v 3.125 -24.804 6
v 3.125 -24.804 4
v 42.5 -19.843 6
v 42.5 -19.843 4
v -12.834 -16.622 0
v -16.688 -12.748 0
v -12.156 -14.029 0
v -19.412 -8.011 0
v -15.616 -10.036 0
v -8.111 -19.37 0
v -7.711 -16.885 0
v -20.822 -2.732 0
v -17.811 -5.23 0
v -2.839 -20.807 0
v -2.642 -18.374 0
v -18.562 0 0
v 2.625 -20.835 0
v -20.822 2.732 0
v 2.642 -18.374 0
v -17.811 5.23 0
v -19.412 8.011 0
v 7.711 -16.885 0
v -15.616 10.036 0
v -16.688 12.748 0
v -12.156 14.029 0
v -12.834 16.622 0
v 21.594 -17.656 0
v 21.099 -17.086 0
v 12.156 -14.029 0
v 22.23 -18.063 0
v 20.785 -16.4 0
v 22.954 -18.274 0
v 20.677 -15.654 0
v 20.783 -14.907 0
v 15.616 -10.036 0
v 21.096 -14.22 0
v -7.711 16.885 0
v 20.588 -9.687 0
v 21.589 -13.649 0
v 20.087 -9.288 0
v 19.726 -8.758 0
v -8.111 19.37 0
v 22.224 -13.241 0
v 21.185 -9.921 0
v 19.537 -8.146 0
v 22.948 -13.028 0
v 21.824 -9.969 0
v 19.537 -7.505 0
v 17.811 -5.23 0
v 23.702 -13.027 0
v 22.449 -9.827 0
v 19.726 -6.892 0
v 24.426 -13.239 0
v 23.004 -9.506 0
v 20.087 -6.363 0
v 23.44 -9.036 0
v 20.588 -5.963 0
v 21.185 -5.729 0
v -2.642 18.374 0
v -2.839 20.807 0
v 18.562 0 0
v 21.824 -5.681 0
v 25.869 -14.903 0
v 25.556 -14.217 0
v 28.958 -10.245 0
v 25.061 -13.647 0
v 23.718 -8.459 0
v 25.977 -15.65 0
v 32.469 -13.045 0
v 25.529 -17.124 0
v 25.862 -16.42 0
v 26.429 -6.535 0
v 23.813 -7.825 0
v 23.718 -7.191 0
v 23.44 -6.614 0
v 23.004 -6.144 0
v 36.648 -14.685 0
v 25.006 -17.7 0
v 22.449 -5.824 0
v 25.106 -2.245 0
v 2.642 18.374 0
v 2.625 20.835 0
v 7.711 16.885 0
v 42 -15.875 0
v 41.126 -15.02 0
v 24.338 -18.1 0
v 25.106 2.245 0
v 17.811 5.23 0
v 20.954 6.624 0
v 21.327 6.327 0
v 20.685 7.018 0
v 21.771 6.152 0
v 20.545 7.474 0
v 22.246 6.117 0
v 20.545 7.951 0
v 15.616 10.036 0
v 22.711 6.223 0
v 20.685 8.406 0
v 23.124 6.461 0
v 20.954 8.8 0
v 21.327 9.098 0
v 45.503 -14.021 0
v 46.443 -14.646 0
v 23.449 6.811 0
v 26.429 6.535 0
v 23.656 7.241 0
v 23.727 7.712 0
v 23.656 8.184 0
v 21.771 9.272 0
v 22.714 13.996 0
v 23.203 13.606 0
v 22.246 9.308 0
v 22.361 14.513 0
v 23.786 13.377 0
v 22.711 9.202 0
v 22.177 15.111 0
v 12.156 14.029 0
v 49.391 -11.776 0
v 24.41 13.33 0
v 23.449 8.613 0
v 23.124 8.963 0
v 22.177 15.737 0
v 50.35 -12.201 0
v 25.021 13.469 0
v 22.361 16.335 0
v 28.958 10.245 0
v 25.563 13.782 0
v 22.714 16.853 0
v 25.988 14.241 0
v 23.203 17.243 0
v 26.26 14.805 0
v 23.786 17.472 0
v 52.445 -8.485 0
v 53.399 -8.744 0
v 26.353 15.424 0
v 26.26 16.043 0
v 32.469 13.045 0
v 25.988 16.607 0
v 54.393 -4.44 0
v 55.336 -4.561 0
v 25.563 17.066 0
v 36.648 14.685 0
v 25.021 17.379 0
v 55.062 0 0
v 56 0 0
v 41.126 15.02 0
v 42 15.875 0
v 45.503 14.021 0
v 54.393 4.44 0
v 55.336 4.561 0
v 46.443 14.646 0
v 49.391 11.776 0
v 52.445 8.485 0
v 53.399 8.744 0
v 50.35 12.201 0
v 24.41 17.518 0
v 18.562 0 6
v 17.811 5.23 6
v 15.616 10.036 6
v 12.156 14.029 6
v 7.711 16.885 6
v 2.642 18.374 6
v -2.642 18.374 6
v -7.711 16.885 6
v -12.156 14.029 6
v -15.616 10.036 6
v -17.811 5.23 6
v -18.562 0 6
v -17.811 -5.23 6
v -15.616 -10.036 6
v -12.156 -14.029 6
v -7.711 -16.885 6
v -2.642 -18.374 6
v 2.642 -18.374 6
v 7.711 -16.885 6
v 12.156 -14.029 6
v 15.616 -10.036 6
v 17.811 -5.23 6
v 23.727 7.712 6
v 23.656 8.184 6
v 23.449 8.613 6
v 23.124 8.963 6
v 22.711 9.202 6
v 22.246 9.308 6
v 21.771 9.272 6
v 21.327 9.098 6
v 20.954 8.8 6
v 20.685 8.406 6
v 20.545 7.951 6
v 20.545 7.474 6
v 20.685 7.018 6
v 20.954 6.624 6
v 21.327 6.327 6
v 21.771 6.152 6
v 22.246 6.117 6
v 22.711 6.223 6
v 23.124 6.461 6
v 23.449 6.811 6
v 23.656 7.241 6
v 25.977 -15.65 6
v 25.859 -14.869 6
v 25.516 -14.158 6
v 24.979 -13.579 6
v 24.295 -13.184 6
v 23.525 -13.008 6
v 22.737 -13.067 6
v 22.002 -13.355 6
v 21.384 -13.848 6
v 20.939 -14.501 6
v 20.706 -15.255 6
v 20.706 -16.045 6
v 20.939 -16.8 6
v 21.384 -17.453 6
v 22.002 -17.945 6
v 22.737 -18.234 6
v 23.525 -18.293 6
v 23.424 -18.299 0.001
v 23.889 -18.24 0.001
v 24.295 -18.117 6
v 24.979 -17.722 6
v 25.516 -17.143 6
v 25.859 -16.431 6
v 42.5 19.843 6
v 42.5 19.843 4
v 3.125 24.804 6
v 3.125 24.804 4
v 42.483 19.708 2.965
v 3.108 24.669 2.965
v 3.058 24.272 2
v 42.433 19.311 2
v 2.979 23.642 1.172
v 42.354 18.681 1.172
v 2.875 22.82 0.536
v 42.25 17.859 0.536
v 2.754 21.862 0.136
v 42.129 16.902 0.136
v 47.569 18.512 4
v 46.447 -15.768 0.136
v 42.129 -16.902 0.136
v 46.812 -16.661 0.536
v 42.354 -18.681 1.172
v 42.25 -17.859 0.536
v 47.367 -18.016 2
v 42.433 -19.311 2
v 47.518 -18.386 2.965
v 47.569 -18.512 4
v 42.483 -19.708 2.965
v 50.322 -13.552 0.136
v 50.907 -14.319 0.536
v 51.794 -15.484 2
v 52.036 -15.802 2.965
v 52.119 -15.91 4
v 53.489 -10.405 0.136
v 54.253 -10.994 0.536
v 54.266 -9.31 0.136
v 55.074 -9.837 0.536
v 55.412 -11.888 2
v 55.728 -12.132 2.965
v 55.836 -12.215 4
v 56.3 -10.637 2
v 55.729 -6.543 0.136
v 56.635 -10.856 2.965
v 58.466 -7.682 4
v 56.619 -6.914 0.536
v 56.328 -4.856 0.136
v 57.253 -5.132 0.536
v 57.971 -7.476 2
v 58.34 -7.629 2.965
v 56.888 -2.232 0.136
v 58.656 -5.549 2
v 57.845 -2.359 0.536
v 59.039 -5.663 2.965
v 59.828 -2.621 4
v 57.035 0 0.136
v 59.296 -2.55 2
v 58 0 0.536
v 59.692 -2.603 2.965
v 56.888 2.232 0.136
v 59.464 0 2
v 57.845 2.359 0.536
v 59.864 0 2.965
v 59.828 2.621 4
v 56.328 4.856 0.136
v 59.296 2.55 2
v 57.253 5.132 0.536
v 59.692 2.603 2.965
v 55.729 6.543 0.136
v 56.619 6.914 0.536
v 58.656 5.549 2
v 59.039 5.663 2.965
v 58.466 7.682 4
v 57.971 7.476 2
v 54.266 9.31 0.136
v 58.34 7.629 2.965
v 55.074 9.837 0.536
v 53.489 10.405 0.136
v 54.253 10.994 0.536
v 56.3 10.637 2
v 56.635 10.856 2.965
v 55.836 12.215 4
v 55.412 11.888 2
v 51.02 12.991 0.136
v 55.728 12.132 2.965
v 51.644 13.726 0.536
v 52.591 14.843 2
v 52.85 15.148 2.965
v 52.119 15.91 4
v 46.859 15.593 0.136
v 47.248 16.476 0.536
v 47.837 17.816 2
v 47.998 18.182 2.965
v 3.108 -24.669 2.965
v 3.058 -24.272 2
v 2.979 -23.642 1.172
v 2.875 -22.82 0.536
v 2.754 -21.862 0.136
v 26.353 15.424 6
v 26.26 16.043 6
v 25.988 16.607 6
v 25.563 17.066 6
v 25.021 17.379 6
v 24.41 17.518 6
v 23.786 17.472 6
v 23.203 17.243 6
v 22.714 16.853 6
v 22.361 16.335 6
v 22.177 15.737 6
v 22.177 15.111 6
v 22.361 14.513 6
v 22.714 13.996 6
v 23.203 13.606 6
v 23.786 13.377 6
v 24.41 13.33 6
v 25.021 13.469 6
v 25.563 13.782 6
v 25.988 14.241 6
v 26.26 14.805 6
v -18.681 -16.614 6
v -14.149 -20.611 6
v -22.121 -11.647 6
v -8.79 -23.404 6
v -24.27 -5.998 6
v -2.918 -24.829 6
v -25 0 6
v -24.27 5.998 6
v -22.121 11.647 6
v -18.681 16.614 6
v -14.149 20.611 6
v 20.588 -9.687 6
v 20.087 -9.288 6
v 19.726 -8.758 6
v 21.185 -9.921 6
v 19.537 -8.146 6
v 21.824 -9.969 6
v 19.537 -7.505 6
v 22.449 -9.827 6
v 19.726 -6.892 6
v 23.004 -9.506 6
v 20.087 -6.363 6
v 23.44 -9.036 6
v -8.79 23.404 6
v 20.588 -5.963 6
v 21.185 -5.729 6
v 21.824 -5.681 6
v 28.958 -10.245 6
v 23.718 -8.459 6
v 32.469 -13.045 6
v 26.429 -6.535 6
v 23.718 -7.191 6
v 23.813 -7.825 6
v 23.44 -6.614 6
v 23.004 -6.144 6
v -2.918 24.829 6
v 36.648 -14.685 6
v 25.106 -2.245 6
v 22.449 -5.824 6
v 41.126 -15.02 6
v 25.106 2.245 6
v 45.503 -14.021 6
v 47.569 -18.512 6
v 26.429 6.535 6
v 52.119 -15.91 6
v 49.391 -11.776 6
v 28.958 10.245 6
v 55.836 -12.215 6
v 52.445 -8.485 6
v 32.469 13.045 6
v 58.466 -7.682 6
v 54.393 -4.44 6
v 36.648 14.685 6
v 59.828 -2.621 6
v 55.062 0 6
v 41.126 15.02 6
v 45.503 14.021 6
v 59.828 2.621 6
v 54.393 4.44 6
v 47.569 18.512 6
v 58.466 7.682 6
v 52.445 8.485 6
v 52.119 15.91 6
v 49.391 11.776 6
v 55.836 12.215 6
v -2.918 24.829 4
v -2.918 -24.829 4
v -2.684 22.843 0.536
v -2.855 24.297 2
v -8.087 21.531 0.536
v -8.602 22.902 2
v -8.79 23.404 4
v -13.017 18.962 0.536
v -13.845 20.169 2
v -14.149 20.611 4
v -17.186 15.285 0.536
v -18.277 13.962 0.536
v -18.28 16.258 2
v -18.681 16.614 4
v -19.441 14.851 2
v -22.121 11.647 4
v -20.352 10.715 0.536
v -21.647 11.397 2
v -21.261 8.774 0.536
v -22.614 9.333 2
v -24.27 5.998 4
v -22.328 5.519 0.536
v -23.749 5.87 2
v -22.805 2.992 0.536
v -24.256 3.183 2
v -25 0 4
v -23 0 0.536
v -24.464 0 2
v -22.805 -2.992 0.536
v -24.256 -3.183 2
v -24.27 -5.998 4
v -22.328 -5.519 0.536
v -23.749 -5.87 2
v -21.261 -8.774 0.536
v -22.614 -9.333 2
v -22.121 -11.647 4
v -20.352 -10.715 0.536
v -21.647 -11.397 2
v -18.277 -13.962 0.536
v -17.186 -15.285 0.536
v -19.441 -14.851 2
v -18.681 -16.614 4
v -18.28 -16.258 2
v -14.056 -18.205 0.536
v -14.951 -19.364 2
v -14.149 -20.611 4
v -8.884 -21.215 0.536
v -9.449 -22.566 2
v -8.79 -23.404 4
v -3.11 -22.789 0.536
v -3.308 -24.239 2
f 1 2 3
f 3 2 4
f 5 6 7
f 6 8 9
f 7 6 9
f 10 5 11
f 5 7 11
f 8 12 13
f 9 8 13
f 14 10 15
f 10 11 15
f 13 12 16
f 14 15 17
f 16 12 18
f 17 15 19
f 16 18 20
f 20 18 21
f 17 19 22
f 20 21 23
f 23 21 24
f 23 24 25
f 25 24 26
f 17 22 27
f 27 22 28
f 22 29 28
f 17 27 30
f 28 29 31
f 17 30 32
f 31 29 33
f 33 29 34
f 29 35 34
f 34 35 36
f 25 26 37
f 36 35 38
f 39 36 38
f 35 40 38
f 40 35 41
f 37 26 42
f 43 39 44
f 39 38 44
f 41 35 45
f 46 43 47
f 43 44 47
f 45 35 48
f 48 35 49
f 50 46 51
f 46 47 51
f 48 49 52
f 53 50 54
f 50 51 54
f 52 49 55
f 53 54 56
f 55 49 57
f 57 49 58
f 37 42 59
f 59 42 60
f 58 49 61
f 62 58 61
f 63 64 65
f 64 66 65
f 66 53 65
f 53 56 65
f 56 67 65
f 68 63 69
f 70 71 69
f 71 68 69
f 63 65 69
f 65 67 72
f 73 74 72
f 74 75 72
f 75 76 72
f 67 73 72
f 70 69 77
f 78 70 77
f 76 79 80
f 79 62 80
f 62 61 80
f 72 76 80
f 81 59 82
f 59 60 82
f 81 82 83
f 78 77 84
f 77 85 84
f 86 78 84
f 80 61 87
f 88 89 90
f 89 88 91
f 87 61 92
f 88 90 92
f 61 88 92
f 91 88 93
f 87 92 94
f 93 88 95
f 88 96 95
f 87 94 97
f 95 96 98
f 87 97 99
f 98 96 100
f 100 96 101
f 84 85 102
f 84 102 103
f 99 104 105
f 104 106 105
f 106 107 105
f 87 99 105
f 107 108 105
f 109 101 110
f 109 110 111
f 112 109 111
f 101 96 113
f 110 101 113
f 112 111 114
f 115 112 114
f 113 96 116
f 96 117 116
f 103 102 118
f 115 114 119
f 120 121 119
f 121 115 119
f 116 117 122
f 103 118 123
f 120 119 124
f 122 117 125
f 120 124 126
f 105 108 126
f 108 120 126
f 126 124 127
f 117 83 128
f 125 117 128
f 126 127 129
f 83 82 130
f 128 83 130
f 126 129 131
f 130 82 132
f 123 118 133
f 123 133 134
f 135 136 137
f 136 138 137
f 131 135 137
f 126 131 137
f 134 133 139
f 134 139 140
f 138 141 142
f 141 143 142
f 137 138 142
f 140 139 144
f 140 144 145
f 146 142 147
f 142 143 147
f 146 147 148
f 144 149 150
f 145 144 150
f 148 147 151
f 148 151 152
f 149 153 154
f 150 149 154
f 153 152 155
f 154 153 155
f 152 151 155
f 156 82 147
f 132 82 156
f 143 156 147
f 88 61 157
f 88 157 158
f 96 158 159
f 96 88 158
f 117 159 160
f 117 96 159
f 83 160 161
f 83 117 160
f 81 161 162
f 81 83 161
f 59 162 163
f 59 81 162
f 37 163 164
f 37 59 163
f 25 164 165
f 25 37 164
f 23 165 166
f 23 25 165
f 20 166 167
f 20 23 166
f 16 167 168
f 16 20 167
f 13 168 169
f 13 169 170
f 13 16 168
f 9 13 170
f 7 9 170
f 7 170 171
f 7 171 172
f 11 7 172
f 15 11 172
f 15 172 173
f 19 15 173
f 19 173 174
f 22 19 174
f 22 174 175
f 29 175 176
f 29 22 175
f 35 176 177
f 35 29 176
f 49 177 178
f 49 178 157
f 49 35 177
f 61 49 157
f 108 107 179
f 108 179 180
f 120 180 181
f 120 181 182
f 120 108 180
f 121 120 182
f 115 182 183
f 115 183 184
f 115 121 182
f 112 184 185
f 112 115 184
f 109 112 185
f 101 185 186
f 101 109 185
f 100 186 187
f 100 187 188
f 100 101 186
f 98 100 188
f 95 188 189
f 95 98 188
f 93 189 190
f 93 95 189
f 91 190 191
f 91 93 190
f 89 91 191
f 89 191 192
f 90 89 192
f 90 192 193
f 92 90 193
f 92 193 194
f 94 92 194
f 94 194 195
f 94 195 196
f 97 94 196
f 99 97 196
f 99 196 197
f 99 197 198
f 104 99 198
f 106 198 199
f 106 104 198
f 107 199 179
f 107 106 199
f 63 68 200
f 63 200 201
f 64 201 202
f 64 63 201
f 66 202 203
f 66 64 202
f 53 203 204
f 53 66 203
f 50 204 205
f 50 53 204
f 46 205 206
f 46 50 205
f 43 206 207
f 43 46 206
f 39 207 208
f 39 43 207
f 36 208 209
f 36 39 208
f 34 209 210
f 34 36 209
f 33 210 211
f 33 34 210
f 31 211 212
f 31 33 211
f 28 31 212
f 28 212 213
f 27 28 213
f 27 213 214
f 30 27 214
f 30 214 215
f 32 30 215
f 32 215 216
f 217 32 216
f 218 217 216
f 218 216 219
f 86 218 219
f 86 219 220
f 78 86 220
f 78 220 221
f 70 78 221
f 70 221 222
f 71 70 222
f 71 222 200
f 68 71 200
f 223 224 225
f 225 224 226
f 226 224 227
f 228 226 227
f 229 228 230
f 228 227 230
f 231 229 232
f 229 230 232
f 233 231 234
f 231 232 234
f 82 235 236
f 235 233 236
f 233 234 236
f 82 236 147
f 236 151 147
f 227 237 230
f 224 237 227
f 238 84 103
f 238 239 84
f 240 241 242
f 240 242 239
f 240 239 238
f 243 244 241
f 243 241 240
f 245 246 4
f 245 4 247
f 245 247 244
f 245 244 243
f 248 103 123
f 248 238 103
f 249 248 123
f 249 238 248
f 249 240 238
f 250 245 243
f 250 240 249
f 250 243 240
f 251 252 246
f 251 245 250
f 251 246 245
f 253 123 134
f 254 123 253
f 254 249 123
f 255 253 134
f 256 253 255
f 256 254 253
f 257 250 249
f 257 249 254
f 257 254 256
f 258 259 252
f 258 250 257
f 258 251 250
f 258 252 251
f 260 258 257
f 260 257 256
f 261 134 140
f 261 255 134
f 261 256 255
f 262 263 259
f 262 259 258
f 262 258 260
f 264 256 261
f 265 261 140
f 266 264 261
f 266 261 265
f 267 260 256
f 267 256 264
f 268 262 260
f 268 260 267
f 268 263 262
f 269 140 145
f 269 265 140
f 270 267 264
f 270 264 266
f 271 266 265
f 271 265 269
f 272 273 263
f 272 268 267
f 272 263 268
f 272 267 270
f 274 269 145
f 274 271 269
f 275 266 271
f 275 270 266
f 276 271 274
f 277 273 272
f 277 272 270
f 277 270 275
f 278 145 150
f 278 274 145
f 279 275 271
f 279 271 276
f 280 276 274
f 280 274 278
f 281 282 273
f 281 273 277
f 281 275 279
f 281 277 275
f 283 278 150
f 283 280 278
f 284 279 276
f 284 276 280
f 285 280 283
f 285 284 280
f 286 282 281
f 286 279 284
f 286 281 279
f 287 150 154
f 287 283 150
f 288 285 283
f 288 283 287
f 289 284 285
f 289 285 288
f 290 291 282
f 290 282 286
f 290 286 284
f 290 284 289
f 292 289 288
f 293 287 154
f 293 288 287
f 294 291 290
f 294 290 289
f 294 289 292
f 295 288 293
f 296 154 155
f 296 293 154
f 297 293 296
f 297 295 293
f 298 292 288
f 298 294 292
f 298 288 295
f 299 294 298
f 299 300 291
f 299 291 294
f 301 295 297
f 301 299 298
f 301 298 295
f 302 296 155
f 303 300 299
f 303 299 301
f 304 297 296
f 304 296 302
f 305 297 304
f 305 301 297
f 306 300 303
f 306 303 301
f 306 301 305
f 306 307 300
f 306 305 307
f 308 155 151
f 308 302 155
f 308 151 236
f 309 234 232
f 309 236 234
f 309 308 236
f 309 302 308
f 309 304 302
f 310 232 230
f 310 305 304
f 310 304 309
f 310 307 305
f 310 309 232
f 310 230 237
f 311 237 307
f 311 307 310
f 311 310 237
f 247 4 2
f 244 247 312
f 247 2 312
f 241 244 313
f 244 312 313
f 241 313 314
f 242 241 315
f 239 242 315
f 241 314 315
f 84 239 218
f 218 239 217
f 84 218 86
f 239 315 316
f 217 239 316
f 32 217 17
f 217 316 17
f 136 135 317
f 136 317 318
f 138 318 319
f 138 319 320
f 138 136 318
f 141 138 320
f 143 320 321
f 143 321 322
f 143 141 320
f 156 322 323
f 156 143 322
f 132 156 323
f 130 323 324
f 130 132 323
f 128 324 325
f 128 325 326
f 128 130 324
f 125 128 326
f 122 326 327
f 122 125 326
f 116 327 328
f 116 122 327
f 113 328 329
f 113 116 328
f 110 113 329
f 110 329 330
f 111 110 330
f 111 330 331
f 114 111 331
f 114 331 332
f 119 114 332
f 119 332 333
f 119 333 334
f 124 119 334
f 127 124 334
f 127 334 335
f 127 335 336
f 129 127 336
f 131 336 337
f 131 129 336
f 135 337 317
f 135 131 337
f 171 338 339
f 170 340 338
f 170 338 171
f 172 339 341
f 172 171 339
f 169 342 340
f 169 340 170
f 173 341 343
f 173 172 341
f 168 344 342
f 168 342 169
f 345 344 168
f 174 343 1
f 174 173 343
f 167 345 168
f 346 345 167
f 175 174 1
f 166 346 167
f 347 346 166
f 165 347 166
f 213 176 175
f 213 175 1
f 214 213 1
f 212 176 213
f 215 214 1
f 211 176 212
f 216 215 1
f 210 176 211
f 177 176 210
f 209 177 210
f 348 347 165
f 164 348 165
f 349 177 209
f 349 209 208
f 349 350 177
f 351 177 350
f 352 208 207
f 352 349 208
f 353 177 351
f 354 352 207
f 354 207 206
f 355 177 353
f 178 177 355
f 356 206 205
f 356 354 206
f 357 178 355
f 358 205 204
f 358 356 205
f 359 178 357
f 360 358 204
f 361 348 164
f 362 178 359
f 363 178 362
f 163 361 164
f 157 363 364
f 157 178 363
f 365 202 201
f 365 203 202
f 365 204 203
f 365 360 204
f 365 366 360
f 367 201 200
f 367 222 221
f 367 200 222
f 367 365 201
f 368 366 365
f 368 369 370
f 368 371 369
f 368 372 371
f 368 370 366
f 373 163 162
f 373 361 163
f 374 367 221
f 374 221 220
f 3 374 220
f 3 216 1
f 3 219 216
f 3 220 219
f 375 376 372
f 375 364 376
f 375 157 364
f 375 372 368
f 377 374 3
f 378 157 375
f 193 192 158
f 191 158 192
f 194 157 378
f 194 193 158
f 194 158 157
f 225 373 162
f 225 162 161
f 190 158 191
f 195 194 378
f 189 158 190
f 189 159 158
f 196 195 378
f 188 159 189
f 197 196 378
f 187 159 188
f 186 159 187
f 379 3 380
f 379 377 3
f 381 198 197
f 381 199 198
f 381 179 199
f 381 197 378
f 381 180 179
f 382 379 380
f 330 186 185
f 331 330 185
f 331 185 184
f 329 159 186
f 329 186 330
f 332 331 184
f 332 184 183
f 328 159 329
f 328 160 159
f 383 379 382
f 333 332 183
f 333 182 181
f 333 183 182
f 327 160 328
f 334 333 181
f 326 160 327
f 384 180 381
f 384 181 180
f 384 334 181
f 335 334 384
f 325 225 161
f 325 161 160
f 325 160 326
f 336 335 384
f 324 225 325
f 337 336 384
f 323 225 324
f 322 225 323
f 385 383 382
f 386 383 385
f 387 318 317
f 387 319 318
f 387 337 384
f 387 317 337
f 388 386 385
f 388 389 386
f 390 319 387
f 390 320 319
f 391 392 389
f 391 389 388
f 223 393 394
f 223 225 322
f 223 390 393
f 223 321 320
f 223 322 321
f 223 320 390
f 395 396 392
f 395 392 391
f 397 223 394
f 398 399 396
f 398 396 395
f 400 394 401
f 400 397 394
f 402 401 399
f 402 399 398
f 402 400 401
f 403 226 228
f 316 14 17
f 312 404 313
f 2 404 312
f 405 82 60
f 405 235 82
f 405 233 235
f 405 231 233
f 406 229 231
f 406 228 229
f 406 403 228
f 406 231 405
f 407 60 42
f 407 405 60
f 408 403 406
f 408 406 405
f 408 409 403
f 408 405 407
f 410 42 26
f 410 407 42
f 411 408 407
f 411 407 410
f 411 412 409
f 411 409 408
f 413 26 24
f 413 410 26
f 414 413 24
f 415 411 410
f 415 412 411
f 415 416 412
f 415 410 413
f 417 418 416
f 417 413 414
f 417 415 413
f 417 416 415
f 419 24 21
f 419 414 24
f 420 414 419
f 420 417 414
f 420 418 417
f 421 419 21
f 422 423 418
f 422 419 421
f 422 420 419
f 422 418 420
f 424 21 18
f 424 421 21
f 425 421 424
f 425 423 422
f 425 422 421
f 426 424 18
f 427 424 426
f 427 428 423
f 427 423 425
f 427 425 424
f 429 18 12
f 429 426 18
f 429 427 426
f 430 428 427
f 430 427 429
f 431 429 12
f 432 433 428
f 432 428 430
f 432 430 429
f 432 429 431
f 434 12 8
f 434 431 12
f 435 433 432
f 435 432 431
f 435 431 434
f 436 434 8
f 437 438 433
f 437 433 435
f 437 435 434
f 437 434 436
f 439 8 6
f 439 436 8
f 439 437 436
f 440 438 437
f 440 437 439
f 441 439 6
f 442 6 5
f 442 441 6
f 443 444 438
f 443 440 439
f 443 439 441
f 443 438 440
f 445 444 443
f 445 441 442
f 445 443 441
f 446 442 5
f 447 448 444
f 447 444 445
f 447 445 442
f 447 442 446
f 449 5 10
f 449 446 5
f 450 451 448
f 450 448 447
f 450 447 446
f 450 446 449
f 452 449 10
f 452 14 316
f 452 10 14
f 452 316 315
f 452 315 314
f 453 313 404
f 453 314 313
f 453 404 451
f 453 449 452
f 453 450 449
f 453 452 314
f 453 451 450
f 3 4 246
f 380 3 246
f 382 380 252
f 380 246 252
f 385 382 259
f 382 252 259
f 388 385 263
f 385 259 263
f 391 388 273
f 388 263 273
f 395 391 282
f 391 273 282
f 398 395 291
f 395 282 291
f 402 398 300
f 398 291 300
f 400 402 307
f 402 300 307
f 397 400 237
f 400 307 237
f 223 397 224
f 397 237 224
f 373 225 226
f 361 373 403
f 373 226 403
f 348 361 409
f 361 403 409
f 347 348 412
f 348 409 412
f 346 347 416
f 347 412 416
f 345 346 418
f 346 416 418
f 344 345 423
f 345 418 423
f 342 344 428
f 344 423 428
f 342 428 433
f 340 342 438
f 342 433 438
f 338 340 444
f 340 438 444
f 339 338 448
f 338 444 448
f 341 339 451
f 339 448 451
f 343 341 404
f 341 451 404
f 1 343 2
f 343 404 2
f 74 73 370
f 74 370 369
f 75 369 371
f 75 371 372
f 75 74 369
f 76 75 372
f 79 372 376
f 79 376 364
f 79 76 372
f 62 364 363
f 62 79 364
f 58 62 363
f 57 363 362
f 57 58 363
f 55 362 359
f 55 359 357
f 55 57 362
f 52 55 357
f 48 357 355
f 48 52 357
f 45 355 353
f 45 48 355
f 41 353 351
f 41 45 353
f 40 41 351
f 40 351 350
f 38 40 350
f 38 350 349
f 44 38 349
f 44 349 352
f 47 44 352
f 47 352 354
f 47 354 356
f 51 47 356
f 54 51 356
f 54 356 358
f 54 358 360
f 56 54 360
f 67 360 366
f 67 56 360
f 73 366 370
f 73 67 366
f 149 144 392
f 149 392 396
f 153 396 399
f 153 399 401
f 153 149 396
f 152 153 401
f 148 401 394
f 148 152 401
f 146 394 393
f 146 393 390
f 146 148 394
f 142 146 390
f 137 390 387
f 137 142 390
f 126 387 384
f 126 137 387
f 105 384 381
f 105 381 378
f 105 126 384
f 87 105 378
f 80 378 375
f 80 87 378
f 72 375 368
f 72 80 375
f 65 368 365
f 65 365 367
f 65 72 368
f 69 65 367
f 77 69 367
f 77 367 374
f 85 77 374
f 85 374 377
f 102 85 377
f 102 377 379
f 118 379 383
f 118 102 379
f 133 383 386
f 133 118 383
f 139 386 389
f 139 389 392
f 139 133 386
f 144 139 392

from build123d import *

# Parameters (mm, degrees)
SKETCH1_R           = 2.15
SKETCH1_R_2         = 1.6
SKETCH1_R_3         = 2.1
SKETCH1_R_4         = 2.65
SKETCH1_R_5         = 18.5625
SKETCH1_R_6         = 15.0625
BOSS_EXTRUDE1_DEPTH = 6
FILLET1_R           = 4


with BuildPart() as part:
    # Sketch1 → Boss-Extrude1 (new body)
    with BuildSketch(Plane.XY):
        with BuildLine():
            Line((3.125, -24.803918541), (42.5, -19.843134833))
            ThreePointArc((42.5, -19.843134833), (60, 0), (42.5, 19.843134833))
            Line((42.5, 19.843134833), (3.125, 24.803918541))
            ThreePointArc((3.125, 24.803918541), (-25, 0), (3.125, -24.803918541))
        make_face()
        with Locations((21.663293527, -7.825180806)):
            Circle(SKETCH1_R, mode=Mode.SUBTRACT)
        with Locations((22.126671777, 7.712150618)):
            Circle(SKETCH1_R_2, mode=Mode.SUBTRACT)
        with Locations((24.253343554, 15.424301236)):
            Circle(SKETCH1_R_3, mode=Mode.SUBTRACT)
        with Locations((23.326587053, -15.650361612)):
            Circle(SKETCH1_R_4, mode=Mode.SUBTRACT)
        Circle(SKETCH1_R_5, mode=Mode.SUBTRACT)
        with Locations((40, 0)):
            Circle(SKETCH1_R_6, mode=Mode.SUBTRACT)
    extrude(amount=BOSS_EXTRUDE1_DEPTH)

    # Fillet1
    # the kernel refuses this fillet: 4 mm, written as the material it takes off along each edge
    with BuildSketch(Plane(origin=(0, 0, 0), x_dir=(0.12499999999999982, 0.9921567416492215, 0), z_dir=(0.9921567416492215, -0.12499999999999982, 0))) as fillet1_piece_1:
        with BuildLine():
            CenterArc((25 - FILLET1_R, FILLET1_R), FILLET1_R, 270, 90)
            Line((25 - FILLET1_R, 0), (25, 0))
            Line((25, 0), (25, FILLET1_R))
        make_face()
    revolve(axis=Axis((0, 0, 0), (0, 0, 1)), revolution_arc=194.361511563, mode=Mode.SUBTRACT)
    with BuildSketch(Plane(origin=(42.5, 19.843134833, 0), x_dir=(0, 0, 1), z_dir=(-0.9921567416492215, 0.12500000000000022, 0)), Plane(origin=(3.125, -24.803918541, 0), x_dir=(0, 0, 1), z_dir=(0.9921567416492215, 0.12500000000000014, 0))) as fillet1_piece_2:
        with BuildLine():
            CenterArc((FILLET1_R, -FILLET1_R), FILLET1_R, 90, 90)
            Line((0, -FILLET1_R), (0, 0))
            Line((0, 0), (FILLET1_R, 0))
        make_face()
    extrude(amount=39.686269666, mode=Mode.SUBTRACT)
    with BuildSketch(Plane(origin=(40, 0, 0), x_dir=(0.12499999999999938, -0.9921567416492216, 0), z_dir=(-0.9921567416492216, -0.12499999999999938, 0))) as fillet1_piece_3:
        with BuildLine():
            CenterArc((20 - FILLET1_R, FILLET1_R), FILLET1_R, 270, 90)
            Line((20 - FILLET1_R, 0), (20, 0))
            Line((20, 0), (20, FILLET1_R))
        make_face()
    revolve(axis=Axis((40, 0, 0), (0, 0, 1)), revolution_arc=165.638488437, mode=Mode.SUBTRACT)


solid = part.part
